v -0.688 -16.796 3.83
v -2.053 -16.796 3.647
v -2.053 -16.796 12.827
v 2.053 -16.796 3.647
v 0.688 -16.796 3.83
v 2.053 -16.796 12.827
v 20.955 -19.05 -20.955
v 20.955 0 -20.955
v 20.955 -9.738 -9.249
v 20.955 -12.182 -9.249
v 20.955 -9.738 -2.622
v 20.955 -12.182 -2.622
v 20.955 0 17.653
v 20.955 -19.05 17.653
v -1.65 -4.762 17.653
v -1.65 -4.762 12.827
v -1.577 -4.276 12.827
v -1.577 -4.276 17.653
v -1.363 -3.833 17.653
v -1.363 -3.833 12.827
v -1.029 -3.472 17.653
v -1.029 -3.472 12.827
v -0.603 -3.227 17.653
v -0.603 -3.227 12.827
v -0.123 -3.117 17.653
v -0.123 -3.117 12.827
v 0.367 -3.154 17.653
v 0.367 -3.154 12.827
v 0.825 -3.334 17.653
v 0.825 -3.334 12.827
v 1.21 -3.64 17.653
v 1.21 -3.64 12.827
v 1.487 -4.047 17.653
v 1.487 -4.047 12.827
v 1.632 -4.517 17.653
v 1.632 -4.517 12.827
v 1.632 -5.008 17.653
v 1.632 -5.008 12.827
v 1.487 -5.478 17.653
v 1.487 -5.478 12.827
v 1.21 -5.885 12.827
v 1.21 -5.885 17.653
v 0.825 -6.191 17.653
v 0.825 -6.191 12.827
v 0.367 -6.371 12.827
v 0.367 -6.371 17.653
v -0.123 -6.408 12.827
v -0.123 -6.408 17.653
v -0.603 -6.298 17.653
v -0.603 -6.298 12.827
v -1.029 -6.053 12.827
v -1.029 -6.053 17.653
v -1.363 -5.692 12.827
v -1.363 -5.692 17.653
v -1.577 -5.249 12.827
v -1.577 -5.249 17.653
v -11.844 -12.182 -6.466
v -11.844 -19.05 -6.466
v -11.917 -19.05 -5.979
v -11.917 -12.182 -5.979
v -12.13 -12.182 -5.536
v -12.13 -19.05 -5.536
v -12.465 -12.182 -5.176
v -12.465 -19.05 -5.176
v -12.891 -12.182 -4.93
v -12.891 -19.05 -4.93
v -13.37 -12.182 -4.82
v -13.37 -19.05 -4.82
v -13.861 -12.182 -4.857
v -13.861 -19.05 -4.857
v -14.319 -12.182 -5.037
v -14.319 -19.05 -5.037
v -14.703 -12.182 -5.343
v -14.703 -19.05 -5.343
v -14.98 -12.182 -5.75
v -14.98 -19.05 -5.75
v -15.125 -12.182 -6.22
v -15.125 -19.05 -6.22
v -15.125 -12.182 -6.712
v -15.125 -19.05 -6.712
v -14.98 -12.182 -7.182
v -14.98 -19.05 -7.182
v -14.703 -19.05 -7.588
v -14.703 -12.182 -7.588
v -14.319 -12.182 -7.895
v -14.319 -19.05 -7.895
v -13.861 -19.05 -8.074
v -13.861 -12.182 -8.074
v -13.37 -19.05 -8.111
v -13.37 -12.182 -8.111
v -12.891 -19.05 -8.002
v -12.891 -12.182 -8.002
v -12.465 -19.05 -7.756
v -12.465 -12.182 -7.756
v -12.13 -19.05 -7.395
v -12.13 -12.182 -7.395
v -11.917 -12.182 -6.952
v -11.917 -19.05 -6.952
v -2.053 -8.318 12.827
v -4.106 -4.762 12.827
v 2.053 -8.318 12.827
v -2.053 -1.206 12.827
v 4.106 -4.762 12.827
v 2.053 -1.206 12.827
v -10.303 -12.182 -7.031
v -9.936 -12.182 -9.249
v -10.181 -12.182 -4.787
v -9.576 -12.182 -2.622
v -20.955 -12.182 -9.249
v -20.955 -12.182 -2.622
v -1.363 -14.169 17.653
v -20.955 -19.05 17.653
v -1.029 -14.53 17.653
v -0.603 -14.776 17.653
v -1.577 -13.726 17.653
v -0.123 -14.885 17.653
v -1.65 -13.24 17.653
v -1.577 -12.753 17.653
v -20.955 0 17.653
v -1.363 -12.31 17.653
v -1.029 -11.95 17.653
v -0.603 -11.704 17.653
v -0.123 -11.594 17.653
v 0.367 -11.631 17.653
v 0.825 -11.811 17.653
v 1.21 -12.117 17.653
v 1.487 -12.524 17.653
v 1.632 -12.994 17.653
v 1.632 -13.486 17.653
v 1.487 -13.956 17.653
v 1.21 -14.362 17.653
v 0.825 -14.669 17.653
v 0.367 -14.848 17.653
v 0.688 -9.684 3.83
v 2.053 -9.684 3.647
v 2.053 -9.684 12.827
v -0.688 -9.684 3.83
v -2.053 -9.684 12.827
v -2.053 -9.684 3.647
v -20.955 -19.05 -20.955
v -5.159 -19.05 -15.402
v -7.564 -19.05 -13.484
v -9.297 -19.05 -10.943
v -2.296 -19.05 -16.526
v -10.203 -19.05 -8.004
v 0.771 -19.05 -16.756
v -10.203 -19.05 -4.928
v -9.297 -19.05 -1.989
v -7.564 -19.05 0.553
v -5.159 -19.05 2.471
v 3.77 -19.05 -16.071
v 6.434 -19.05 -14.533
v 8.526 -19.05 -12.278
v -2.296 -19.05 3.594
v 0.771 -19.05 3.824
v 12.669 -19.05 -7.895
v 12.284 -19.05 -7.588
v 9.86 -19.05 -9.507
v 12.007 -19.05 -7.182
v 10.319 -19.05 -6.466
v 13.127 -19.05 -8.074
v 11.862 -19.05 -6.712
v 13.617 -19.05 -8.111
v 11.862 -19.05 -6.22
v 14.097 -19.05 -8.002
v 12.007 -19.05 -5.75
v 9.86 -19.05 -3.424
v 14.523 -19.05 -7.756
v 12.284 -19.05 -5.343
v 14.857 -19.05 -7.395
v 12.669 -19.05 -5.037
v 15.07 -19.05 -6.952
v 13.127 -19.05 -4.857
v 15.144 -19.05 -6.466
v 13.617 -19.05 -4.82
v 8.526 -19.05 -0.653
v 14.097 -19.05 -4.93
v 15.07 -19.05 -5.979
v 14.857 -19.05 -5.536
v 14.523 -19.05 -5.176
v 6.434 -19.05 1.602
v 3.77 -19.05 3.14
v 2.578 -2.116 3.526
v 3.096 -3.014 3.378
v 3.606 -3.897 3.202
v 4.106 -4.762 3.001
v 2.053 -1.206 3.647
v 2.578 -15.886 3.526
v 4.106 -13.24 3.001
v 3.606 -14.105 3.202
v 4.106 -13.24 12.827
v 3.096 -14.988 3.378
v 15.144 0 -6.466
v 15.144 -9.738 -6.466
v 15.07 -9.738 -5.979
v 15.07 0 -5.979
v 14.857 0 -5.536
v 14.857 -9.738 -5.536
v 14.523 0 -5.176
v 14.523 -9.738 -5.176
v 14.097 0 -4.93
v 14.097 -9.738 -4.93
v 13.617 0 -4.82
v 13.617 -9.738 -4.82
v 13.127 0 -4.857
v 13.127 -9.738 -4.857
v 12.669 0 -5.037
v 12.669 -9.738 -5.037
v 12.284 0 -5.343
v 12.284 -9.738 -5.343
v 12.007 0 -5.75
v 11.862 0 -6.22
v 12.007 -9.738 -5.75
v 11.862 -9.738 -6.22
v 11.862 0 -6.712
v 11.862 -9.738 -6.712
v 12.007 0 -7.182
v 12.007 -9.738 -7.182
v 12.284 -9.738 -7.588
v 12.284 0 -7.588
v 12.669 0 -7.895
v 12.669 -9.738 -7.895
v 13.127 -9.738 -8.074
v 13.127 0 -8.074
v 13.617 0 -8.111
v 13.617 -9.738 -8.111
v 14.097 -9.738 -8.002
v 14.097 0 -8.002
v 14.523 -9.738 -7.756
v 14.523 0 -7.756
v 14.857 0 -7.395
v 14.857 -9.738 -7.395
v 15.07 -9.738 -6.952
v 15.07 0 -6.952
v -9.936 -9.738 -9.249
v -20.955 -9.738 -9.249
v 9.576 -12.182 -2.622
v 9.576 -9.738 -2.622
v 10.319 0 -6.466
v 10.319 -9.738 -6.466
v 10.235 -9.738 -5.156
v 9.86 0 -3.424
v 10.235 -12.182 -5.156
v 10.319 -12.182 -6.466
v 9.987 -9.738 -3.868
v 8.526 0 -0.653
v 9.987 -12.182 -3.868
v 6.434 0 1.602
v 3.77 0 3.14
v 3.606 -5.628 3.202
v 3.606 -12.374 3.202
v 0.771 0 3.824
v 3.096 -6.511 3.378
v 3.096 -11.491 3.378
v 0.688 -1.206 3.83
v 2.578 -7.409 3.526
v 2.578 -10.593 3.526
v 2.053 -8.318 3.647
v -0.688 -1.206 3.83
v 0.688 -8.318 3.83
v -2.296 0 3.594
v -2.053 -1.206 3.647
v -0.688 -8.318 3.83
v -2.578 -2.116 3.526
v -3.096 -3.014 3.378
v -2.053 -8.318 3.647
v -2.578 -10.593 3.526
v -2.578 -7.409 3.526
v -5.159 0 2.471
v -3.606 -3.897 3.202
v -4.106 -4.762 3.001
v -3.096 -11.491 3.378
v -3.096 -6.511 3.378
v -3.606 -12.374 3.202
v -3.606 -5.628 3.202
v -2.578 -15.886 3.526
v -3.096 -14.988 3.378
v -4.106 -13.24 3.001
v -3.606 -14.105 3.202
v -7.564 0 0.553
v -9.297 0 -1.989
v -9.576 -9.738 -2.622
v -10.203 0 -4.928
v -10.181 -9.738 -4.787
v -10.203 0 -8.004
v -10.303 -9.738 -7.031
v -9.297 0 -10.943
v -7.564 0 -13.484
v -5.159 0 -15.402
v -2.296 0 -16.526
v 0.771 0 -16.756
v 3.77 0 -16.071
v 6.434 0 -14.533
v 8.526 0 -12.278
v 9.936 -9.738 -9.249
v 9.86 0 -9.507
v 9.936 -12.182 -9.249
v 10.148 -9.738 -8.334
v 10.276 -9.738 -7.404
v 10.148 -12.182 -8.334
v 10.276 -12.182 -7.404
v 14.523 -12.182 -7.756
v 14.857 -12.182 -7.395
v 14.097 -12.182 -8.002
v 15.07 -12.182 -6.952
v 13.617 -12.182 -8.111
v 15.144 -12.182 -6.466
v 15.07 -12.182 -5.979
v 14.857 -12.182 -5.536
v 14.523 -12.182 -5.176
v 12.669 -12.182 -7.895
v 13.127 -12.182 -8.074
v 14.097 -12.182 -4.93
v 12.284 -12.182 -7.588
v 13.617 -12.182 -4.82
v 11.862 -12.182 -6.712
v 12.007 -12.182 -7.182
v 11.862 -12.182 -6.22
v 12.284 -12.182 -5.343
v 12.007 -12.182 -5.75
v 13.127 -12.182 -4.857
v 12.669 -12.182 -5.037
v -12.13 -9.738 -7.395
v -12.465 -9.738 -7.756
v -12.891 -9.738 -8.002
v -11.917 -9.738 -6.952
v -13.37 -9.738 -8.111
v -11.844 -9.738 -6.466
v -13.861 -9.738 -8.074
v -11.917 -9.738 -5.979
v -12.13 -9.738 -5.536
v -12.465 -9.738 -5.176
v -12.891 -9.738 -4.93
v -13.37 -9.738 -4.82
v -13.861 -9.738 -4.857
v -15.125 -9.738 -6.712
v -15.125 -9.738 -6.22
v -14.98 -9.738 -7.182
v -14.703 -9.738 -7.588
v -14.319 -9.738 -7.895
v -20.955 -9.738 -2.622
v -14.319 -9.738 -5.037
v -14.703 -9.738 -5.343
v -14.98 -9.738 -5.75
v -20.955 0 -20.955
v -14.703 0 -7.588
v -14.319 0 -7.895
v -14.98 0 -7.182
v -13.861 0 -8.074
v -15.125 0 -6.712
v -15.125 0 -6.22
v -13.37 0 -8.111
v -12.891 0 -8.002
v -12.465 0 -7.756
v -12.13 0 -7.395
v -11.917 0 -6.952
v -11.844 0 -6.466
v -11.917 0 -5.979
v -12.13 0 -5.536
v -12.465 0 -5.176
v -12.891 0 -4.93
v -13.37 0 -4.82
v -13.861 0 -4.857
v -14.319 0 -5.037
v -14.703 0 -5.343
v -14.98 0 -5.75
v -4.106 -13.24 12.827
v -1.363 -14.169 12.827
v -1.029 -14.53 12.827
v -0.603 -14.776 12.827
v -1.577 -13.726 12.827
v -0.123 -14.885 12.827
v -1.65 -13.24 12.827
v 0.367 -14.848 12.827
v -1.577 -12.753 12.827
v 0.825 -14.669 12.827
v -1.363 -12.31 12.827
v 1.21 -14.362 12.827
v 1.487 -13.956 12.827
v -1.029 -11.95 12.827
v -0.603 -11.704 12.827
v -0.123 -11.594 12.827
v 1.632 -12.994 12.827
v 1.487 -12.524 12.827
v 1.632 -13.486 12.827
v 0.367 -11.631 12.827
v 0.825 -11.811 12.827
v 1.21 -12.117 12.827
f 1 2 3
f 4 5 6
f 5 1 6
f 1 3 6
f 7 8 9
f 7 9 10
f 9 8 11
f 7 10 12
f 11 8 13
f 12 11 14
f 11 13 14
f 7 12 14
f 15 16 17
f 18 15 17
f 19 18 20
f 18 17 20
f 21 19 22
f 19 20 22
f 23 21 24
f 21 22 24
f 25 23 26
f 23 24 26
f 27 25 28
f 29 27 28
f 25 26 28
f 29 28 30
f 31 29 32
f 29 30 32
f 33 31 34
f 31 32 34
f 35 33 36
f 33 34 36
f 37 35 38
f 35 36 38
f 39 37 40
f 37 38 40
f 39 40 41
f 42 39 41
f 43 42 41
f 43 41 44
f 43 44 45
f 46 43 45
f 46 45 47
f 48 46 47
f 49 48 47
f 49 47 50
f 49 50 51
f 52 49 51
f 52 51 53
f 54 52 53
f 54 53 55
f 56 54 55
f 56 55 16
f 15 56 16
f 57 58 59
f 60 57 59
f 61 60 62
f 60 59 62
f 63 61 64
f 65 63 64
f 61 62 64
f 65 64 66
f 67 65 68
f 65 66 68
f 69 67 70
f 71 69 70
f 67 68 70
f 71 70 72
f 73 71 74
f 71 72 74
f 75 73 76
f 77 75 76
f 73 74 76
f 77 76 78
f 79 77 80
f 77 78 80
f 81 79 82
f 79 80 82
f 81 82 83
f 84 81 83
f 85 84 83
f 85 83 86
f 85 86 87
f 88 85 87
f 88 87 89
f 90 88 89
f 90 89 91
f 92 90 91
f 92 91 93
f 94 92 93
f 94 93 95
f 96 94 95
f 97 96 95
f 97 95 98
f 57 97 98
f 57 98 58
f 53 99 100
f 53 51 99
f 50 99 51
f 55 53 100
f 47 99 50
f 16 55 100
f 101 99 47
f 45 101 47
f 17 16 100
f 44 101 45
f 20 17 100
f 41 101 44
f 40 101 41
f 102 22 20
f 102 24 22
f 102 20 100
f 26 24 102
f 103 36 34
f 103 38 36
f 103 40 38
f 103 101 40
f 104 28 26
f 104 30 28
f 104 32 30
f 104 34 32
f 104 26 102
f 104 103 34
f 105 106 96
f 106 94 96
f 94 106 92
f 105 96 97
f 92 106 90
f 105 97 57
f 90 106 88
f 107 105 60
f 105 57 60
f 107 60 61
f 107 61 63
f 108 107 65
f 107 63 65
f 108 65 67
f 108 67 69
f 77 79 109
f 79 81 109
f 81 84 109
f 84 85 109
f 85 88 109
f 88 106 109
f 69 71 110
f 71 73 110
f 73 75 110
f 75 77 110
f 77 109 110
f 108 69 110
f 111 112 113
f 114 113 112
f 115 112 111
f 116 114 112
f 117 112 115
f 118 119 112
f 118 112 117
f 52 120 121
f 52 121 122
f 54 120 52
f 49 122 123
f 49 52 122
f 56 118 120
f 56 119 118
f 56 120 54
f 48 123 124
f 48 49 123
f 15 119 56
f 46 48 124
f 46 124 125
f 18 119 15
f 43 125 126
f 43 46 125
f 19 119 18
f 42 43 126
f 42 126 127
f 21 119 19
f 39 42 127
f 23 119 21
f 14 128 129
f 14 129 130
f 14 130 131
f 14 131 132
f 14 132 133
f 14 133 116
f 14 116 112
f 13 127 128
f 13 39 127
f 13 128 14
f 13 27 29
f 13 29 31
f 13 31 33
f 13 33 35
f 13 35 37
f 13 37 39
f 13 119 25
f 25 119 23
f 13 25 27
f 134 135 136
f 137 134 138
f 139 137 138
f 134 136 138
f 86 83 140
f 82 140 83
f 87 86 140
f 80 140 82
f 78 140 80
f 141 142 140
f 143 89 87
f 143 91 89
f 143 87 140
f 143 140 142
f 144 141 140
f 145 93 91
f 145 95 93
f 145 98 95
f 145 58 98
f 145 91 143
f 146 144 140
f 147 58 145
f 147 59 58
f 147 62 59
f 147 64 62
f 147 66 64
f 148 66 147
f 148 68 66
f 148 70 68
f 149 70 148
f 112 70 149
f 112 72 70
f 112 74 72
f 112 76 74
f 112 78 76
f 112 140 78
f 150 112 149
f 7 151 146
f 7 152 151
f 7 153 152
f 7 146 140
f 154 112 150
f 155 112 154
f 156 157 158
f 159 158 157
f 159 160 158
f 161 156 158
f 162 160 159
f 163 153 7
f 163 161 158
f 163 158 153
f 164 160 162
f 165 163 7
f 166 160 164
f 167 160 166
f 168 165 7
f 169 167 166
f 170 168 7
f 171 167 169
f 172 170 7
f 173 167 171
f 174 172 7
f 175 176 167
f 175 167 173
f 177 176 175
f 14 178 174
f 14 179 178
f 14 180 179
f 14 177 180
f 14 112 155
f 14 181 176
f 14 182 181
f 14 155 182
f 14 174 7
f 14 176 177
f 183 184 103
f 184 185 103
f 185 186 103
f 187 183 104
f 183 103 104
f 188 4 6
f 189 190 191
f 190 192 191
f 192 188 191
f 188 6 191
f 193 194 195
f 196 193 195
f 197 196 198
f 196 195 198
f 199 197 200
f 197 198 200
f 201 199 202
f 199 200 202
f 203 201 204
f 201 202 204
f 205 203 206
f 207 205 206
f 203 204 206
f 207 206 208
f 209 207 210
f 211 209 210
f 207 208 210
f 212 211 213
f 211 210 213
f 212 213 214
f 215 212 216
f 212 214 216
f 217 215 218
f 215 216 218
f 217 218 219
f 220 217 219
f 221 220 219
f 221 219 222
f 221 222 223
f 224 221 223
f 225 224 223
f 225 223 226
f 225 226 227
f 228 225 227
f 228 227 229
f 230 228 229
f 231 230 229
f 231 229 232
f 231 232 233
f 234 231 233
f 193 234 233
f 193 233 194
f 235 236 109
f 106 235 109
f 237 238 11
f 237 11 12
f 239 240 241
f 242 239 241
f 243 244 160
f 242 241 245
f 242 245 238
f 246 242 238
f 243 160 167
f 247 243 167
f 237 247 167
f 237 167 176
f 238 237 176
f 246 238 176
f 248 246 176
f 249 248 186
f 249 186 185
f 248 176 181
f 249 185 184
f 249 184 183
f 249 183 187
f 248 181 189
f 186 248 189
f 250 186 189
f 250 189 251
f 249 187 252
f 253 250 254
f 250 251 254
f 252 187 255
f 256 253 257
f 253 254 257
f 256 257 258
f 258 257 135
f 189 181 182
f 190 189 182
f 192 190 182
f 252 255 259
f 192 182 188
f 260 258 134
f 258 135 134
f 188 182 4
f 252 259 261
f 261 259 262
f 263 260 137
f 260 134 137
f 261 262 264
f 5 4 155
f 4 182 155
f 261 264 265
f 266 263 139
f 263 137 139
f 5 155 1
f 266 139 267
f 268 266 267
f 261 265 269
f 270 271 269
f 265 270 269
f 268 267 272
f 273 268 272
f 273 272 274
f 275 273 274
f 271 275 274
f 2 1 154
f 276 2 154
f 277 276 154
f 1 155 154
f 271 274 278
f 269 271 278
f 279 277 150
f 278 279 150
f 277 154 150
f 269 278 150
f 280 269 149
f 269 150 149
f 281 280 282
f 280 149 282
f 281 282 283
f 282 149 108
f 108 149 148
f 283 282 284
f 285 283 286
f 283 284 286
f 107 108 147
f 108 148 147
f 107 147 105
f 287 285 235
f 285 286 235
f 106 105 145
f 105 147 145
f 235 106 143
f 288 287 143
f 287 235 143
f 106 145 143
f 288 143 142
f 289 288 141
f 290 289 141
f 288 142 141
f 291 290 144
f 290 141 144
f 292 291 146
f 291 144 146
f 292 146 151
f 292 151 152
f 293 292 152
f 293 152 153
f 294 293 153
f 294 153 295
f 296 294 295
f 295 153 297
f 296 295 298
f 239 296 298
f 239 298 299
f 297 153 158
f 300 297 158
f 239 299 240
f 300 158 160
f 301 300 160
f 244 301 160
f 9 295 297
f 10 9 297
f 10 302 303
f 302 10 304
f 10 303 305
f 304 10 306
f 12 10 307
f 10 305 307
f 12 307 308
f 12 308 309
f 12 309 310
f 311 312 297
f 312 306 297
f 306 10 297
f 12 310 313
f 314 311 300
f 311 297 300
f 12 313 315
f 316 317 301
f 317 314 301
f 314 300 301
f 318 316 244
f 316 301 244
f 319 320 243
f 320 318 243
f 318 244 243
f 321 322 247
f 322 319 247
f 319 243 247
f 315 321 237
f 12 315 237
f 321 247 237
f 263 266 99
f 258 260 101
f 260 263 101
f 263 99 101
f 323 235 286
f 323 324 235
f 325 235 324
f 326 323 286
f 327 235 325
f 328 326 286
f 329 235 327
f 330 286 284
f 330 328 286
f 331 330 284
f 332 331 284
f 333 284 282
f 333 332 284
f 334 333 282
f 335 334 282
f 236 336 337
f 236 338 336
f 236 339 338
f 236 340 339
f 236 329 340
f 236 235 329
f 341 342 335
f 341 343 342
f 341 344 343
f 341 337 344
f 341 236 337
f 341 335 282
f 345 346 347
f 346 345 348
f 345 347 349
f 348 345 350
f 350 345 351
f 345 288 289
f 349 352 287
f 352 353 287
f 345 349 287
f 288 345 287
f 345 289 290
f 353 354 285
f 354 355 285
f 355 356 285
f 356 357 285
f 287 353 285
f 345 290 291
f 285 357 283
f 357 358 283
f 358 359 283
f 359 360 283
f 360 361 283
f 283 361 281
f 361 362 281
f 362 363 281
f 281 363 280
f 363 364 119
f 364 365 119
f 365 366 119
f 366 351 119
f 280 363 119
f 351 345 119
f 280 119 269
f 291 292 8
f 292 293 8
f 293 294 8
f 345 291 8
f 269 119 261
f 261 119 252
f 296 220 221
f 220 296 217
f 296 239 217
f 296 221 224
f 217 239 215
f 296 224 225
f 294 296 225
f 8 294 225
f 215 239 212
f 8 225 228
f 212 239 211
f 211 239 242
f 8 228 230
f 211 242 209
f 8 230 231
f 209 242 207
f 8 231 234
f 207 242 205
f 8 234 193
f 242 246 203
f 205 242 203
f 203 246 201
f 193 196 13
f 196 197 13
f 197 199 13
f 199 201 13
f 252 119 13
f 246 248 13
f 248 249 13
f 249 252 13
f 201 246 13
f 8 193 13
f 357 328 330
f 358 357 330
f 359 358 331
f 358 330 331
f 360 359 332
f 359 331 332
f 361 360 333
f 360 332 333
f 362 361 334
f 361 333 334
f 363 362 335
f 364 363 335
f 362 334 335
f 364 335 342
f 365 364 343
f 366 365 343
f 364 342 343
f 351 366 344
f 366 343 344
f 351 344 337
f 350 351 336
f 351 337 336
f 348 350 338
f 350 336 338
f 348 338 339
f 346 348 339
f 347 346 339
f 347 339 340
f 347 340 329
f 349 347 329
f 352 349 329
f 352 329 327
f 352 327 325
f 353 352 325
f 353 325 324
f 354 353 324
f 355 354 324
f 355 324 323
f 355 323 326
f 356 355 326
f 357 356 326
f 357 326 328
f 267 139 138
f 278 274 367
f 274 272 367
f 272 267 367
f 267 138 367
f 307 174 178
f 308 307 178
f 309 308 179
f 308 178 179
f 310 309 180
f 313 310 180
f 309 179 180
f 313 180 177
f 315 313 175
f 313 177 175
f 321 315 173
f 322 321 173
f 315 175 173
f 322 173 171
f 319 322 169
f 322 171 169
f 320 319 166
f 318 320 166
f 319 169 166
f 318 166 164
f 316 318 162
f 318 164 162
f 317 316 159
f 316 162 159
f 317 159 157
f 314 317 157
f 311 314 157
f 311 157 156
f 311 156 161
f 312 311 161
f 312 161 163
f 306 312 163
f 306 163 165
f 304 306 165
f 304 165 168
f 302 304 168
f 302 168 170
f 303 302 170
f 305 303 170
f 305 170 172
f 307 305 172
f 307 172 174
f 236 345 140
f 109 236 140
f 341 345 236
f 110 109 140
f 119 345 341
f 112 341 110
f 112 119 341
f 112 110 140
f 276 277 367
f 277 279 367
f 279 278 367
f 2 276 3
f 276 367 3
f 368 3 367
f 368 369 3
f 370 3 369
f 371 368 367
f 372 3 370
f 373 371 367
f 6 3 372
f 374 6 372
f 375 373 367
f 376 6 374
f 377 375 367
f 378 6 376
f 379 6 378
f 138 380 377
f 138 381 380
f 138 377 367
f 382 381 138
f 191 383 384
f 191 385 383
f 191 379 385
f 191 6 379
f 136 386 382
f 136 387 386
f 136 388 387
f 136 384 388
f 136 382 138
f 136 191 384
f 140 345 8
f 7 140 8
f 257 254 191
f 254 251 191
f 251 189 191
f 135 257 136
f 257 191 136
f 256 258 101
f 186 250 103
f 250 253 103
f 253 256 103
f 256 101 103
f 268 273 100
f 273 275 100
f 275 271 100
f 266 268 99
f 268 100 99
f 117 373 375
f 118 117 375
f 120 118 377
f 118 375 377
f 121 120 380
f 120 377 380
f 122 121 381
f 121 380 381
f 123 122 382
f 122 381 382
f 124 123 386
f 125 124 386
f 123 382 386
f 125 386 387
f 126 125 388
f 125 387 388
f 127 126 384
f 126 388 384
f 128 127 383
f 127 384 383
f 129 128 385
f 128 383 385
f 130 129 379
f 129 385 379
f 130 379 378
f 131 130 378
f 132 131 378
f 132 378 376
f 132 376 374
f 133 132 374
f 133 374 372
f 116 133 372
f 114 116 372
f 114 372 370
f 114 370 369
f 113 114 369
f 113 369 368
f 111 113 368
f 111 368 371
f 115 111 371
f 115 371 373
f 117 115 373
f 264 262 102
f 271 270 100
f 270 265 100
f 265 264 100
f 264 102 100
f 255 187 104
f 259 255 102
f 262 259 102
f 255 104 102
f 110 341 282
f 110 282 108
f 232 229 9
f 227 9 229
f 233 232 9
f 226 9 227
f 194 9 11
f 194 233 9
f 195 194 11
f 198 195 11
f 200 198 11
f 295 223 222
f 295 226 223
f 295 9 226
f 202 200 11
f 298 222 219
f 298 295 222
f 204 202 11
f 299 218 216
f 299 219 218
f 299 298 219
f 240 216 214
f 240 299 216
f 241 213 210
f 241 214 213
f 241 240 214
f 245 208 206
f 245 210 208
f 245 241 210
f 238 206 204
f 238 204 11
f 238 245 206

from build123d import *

# Parameters (mm, degrees)
F0_W      = 41.91
F0_H      = 35.306
F1_DEPTH  = 19.05
F2_R      = 10.31875
F3_DEPTH  = 19.05
F5_DEPTH  = 14.6530745281
F6_DEPTH  = 5.842
F7_W      = 19.05
F7_H      = 4.8259994193
F8_DEPTH  = 25.4
F9_D      = 3.3
F9_DEPTH  = 12.7
F9_TIP    = 0.9914200214
F11_D     = 3.3
F12_W     = 2.444460988
F12_H     = 6.6262371838
F13_DEPTH = 59.9186
F14_DEPTH = 3.302


with BuildPart() as f1:
    # F0 (on Front) → F1 (new body)
    with BuildSketch(Plane.XZ):
        Rectangle(F0_W, F0_H)
    extrude(amount=F1_DEPTH)

    # F2 (on face) → F3 (cut, through all)
    with BuildSketch(Plane.XZ.offset(19.05)):
        with Locations((0, -6.465669493)):
            Circle(F2_R)
    extrude(amount=-F3_DEPTH, mode=Mode.SUBTRACT)

    # F4 (on face) → F5 (cut, through all)
    with BuildSketch(Plane.XY.offset(17.653)):
        Polygon((2.0530575572, -9.6835951077), (0, -9.6835951077), (-2.0530575572, -9.6835951077), (-4.1061151145, -13.2395951077), (-2.0530575572, -16.7955951077), (2.0530575572, -16.7955951077), (4.1061151145, -13.2395951077), align=None)
        Polygon((-2.0530575572, -8.3185), (0, -8.3185), (2.0530575572, -8.3185), (4.1061151145, -4.7625), (2.0530575572, -1.2065), (-2.0530575572, -1.2065), (-4.1061151145, -4.7625), align=None)
    extrude(amount=-F5_DEPTH, mode=Mode.SUBTRACT)

    # F6 (add): a face of the model
    f6_faces = [f1.faces().sort_by_distance(p)[0] for p in [
        (0, -9.5895806435, 17.653),
    ]]
    extrude(f6_faces, amount=-F6_DEPTH)

    # F7 (on face) → F8 (join)
    with BuildSketch(Plane.YZ.offset(20.955)):
        with Locations((-9.525, 15.2400002904)):
            Rectangle(F7_W, F7_H)
    extrude(amount=-F8_DEPTH)

    # F9
    with Locations(Plane.XY.offset(17.653)):
        with Locations((0, -4.7625), (0, -13.2395951077)):
            Hole(F9_D / 2, depth=F9_DEPTH)
            with Locations((0, 0, -(F9_DEPTH + F9_TIP / 2))):  # 118° drill point
                Cone(0, F9_D / 2, F9_TIP, mode=Mode.SUBTRACT)

    # F11 (through all)
    with Locations(Plane(origin=(0, 0, 0), x_dir=(-1, 0, 0), z_dir=(0, 1, 0))):
        with Locations((-13.49375, -6.465669493), (13.49375, -6.465669493)):
            Hole(F11_D / 2)

    # F12 (on face) → F13 (cut)
    with BuildSketch(Plane(origin=(-20.955, 0, 0), x_dir=(0, -1, 0), z_dir=(-1, 0, 0))):
        with Locations((10.960043408, -5.9355609119)):
            Rectangle(F12_W, F12_H)
    extrude(amount=-F13_DEPTH, mode=Mode.SUBTRACT)

    # F14 (add): a face of the model
    f14_faces = [f1.faces().sort_by_distance(p)[0] for p in [
        (0, -9.525, -17.653),
    ]]
    extrude(f14_faces, amount=F14_DEPTH)


solid = f1.part
